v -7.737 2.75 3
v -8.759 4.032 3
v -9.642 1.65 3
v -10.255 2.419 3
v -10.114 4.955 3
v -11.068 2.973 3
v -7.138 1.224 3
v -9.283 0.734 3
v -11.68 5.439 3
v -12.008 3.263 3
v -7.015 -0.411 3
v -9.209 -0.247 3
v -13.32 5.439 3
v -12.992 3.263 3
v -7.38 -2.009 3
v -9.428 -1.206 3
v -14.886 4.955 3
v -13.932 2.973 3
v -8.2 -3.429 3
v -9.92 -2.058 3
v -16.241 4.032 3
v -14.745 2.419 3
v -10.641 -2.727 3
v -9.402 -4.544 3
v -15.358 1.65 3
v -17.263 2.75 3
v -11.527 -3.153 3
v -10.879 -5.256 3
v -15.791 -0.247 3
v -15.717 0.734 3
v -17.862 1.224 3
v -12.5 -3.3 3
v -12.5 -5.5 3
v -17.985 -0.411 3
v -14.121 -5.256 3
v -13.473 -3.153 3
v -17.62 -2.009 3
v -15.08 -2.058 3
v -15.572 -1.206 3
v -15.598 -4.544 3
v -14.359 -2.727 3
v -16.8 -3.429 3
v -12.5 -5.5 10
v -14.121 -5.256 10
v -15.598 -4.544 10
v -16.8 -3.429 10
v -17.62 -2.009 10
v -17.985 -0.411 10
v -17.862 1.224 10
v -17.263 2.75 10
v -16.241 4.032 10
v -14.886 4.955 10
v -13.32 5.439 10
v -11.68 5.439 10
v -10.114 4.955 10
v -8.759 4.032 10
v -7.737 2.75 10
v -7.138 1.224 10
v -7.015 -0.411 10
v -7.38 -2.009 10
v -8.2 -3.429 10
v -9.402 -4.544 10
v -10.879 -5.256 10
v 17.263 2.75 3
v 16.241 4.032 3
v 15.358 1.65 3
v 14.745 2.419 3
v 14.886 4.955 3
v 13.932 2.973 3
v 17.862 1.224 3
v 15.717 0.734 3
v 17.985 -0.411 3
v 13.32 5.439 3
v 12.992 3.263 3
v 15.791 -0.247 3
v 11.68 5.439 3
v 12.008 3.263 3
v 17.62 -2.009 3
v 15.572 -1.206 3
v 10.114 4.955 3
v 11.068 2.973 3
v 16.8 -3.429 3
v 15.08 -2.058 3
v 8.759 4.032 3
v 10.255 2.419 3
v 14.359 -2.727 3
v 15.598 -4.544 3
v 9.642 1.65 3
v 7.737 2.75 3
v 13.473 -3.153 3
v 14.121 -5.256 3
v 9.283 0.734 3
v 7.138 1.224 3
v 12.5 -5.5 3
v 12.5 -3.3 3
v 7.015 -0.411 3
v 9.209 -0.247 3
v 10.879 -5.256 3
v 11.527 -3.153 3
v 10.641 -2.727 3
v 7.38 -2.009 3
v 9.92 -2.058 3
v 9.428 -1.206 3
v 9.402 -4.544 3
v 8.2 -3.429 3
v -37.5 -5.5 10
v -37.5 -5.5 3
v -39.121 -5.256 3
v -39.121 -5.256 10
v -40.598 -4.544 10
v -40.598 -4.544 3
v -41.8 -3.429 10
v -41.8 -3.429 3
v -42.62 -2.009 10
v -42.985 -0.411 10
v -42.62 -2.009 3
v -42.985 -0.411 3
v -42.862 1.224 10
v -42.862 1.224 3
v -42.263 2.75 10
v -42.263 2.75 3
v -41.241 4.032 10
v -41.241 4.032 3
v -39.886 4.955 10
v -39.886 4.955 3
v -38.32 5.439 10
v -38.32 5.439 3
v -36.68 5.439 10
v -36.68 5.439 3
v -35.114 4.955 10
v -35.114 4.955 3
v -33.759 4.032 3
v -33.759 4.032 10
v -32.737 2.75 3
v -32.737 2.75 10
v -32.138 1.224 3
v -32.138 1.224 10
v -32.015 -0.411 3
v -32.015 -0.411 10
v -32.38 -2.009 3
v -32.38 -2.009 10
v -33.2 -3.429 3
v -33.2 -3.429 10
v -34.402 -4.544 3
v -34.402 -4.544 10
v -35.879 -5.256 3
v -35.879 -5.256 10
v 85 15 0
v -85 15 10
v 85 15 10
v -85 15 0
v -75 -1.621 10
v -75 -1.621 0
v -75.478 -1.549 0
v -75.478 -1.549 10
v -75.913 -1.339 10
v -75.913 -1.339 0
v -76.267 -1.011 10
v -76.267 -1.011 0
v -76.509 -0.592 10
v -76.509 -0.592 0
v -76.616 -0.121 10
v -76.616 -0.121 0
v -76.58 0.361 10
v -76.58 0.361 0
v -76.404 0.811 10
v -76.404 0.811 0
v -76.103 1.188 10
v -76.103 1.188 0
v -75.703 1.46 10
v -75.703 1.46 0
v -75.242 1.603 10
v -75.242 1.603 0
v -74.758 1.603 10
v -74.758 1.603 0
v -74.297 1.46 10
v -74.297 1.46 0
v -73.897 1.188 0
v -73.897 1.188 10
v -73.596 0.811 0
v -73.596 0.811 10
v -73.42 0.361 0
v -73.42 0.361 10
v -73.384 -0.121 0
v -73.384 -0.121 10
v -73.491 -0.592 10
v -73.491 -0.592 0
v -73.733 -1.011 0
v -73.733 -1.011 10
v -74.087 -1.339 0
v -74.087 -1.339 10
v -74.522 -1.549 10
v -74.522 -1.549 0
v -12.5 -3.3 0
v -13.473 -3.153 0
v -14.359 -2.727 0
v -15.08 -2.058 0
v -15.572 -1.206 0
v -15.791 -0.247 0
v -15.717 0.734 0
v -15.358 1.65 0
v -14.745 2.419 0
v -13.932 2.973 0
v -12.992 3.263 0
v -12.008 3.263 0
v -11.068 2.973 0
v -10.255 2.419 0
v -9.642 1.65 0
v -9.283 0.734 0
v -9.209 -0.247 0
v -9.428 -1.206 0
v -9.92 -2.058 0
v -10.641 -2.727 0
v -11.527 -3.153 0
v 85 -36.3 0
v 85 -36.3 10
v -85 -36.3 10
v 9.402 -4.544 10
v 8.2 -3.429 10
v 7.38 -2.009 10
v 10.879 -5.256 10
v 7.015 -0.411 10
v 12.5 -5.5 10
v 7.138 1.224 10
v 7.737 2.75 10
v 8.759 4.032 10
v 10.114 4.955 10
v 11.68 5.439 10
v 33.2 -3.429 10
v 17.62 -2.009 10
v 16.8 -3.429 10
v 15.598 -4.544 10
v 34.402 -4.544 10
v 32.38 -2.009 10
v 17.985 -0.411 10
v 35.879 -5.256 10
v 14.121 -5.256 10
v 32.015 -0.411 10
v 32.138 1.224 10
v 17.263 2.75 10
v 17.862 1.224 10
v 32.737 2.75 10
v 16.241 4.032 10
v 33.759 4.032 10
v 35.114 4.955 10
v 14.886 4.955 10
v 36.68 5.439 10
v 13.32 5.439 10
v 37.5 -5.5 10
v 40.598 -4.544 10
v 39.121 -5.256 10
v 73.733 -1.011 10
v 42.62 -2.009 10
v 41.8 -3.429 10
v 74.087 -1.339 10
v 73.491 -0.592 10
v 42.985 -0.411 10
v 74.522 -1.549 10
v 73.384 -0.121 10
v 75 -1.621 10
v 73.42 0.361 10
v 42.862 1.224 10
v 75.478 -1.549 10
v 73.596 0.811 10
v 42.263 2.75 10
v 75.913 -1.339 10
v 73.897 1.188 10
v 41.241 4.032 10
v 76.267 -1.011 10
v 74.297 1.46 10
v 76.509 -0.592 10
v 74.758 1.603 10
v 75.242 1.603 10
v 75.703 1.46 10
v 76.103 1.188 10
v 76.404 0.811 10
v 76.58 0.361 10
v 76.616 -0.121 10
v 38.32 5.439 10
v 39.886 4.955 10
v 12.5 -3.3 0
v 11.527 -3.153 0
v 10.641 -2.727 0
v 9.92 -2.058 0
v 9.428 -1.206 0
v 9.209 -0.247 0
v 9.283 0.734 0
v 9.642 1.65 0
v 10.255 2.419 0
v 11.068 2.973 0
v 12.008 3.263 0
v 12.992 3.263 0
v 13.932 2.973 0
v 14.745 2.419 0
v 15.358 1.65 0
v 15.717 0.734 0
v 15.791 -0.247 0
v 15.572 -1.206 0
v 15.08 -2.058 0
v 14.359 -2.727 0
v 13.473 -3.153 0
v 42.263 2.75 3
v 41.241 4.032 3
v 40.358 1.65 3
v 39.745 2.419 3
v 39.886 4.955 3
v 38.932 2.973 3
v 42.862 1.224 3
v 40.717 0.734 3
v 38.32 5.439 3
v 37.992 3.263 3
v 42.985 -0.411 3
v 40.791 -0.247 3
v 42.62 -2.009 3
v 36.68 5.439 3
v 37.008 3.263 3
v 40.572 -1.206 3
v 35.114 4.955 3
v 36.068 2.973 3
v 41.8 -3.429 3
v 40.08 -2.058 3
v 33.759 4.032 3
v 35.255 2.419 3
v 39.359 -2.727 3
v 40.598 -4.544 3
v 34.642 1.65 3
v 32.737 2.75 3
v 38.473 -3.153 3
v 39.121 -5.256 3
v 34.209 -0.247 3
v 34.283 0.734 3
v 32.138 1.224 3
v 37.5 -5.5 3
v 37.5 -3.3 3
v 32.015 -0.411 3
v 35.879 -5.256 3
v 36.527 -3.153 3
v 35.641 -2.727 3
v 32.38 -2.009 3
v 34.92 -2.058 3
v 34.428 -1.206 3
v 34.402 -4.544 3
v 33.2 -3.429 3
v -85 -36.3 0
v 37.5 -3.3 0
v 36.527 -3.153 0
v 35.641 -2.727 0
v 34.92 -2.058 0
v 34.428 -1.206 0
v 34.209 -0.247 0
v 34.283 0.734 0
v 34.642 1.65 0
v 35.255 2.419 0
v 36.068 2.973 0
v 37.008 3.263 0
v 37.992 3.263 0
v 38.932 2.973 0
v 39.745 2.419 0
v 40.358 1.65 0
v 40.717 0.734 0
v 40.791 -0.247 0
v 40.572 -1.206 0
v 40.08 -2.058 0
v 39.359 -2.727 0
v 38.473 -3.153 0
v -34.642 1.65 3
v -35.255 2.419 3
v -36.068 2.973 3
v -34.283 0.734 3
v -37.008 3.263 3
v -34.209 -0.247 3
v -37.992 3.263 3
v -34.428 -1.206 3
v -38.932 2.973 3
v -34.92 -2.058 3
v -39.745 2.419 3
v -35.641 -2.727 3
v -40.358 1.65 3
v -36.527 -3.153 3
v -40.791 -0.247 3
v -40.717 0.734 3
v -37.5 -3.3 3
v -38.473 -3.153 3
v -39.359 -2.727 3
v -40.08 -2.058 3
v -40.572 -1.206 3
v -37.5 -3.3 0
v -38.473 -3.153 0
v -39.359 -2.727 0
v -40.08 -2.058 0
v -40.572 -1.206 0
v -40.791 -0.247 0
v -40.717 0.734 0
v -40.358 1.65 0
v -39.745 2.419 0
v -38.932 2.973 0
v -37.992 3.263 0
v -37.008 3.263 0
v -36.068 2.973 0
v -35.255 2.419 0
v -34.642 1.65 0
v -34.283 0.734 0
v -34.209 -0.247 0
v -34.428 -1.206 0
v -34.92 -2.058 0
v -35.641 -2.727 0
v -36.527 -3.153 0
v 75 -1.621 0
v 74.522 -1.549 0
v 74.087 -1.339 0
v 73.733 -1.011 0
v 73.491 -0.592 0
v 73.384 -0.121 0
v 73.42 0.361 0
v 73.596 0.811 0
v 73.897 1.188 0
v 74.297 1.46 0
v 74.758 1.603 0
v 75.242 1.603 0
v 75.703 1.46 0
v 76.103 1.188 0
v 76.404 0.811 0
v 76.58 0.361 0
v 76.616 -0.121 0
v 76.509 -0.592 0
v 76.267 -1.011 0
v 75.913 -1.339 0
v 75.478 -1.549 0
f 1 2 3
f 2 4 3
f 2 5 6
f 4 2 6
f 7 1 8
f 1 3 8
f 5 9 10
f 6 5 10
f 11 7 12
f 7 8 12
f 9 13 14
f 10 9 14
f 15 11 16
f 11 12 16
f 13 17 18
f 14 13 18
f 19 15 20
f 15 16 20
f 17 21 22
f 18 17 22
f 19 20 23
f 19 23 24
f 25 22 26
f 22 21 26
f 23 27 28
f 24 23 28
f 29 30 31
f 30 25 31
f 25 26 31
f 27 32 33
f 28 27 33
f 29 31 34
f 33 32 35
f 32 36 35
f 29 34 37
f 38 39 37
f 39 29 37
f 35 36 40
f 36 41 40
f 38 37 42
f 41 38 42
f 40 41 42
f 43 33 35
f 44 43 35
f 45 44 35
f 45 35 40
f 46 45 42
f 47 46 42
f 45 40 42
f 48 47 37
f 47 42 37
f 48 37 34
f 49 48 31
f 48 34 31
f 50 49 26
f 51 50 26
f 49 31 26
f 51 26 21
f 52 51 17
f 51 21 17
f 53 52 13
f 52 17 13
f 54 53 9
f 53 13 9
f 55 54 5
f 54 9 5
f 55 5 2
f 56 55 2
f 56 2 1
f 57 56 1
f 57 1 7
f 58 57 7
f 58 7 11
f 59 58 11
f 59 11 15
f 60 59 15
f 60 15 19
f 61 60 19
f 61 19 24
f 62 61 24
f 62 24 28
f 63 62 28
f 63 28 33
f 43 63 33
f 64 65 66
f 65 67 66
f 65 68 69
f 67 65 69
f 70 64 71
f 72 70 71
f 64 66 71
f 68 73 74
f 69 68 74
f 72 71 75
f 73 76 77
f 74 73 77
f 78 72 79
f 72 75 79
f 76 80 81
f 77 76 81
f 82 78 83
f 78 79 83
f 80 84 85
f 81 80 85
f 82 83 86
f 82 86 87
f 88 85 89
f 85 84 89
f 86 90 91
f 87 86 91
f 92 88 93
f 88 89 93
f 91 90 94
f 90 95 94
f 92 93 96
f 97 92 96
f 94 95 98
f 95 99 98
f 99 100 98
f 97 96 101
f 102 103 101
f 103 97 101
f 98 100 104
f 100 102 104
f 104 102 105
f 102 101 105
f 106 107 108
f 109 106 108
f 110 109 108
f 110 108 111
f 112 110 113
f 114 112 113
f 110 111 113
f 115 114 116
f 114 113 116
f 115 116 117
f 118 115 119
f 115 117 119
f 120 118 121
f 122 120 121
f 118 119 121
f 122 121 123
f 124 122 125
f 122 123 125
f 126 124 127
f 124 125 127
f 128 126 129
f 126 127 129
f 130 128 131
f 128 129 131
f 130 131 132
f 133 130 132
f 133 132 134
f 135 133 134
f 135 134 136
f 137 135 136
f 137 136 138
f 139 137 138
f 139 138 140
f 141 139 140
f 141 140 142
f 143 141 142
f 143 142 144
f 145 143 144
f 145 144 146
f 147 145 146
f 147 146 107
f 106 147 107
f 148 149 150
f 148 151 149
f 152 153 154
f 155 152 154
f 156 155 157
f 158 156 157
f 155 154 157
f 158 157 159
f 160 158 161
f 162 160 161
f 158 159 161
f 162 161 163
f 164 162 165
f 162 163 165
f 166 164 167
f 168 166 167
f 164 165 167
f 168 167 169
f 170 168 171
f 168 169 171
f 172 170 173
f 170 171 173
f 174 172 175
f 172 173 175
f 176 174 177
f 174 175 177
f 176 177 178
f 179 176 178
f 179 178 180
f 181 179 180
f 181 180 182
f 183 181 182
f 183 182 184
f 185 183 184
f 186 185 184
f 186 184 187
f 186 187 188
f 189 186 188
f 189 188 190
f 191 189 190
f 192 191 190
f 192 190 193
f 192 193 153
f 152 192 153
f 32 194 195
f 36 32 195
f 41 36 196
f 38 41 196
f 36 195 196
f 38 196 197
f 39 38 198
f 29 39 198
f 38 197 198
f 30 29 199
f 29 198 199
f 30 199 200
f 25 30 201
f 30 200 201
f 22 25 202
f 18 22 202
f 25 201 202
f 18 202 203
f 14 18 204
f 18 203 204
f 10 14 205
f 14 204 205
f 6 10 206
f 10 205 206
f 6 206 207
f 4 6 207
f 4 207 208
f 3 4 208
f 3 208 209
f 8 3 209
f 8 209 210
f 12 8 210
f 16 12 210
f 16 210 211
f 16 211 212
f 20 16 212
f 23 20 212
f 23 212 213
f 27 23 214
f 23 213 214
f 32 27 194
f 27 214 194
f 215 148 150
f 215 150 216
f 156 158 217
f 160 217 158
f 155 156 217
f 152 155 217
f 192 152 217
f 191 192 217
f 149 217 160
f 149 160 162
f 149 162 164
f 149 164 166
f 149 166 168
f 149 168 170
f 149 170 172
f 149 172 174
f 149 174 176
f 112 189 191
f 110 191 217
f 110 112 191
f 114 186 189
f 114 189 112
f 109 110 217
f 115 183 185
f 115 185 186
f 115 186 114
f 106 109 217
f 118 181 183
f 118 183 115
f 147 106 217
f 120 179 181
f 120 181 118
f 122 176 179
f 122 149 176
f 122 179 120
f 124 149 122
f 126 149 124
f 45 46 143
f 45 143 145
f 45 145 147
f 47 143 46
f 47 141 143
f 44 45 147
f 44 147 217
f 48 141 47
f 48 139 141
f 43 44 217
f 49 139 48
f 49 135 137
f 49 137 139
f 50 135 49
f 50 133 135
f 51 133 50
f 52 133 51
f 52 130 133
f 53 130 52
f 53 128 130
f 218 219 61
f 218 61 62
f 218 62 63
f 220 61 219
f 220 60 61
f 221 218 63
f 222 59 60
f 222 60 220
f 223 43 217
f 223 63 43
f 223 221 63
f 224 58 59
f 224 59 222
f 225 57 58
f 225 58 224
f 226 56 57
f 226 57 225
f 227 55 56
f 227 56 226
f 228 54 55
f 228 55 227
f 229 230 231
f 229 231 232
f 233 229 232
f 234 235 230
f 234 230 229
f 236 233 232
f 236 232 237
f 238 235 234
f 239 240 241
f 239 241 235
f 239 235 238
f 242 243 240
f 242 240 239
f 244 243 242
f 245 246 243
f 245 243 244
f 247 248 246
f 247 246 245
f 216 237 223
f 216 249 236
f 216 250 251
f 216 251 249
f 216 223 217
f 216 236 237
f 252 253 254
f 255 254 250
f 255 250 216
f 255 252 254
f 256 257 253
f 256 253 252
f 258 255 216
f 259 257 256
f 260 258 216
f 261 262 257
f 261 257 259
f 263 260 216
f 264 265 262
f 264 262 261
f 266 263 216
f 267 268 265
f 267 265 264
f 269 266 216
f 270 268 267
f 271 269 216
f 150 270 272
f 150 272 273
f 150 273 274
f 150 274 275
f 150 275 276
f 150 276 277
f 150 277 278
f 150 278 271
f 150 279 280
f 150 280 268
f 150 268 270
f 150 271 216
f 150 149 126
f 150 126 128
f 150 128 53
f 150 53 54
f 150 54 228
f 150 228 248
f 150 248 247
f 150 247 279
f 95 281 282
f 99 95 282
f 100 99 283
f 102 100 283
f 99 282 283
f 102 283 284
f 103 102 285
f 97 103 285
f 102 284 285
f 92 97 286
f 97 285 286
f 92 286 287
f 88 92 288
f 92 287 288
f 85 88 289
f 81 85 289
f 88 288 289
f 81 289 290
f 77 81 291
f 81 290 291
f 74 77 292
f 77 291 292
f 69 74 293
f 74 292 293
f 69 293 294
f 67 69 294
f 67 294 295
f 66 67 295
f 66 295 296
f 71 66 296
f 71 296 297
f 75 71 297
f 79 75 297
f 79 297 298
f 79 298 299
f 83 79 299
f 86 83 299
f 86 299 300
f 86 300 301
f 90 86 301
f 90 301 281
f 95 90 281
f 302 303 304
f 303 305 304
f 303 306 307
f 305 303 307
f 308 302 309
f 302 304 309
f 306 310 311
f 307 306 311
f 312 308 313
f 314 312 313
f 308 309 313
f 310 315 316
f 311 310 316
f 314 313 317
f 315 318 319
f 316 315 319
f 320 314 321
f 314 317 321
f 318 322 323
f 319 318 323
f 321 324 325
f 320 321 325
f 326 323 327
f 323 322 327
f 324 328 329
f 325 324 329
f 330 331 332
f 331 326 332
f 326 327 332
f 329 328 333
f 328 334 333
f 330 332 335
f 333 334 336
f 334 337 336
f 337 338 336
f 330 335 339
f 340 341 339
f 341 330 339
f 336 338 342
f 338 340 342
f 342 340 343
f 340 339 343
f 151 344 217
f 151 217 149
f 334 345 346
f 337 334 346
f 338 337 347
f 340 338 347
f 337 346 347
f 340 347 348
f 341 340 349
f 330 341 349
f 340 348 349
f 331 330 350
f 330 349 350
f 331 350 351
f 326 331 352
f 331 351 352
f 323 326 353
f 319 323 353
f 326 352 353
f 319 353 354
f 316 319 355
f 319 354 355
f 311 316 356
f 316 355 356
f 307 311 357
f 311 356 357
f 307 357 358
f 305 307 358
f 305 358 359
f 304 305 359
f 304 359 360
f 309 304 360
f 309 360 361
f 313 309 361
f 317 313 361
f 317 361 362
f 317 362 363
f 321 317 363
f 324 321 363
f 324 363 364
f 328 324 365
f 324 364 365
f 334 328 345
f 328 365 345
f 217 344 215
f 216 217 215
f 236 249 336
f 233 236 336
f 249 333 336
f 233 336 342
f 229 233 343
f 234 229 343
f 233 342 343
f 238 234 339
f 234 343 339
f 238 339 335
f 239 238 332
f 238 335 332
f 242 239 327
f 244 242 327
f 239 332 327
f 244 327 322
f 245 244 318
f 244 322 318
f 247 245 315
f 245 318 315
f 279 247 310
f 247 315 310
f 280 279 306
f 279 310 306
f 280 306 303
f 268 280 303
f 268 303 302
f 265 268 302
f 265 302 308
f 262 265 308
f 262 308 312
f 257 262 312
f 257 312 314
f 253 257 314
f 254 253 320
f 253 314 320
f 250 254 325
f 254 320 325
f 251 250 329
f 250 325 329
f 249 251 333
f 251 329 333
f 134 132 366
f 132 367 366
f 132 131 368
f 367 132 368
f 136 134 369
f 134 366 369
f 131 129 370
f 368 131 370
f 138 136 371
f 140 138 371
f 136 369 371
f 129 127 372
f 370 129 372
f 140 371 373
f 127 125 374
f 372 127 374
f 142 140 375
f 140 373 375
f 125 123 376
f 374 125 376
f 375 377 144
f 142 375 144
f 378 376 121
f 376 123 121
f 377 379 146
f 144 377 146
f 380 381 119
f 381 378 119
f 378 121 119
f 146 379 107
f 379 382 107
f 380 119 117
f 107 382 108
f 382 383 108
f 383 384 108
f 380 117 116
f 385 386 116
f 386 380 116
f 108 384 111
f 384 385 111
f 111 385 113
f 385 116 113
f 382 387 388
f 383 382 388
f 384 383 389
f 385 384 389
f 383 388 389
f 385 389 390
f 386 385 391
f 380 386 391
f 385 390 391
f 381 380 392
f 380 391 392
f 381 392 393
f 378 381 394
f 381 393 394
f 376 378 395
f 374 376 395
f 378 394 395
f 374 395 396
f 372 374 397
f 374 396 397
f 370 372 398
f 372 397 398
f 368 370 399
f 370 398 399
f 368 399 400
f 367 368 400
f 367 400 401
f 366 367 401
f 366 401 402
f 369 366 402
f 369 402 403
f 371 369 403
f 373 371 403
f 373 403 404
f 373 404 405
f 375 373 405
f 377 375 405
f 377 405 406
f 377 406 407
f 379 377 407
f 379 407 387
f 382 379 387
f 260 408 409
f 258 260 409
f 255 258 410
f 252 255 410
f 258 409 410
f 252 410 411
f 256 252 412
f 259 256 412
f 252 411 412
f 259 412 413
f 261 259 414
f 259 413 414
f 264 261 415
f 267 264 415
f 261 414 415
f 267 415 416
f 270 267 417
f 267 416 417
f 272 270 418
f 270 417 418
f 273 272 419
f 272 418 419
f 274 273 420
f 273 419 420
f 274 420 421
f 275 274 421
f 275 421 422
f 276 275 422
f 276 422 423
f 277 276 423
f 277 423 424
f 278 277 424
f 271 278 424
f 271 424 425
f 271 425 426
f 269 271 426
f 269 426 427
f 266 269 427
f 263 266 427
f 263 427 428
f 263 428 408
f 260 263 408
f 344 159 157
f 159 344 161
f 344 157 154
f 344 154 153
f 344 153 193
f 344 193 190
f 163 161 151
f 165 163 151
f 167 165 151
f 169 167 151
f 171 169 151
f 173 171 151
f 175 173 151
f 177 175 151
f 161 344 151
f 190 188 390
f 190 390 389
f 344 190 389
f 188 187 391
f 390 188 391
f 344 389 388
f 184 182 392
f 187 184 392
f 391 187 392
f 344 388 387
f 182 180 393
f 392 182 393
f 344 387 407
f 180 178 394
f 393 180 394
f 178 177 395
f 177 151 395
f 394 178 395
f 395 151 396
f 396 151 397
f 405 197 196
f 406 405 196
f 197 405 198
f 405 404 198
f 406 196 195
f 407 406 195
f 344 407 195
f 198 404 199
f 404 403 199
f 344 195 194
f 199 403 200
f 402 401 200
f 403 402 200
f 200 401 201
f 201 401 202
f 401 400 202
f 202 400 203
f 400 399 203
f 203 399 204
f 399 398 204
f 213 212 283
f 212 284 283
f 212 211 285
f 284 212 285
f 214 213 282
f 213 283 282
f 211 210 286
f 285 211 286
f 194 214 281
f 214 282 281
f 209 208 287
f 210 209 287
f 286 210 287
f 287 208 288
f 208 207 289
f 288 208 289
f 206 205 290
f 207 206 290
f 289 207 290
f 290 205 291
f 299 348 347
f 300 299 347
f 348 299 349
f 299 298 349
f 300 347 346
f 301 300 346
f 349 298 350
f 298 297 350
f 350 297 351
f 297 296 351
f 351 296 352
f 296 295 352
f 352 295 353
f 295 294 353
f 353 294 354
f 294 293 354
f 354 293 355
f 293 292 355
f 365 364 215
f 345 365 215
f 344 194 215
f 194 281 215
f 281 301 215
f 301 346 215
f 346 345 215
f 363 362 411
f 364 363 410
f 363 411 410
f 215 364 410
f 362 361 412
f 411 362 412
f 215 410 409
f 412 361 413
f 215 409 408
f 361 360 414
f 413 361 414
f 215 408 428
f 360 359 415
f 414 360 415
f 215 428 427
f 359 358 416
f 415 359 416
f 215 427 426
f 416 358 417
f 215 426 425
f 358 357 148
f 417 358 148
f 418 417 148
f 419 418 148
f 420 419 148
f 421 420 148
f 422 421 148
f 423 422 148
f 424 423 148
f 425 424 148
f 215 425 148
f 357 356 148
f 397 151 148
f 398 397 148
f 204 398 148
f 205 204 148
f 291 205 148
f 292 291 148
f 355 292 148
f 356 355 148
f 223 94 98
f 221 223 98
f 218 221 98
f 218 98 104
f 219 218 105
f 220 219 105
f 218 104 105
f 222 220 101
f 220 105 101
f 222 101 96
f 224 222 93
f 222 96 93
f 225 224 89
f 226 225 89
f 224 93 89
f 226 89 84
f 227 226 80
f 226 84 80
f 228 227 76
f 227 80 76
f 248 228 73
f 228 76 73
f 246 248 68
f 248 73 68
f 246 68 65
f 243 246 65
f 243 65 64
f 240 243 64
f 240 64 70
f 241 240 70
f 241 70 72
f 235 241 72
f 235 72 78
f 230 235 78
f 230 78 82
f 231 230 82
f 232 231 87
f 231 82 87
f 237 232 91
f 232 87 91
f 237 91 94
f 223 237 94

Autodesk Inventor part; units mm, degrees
ref_plane "YZ Plane" through (0, 0, 0) normal (1, 0, 0) x (0, 1, 0)
ref_plane "XZ Plane" through (0, 0, 0) normal (0, 1, 0) x (-1, 0, 0)
ref_plane "XY Plane" through (0, 0, 0) normal (0, 0, 1) x (1, 0, 0)
sketch "Sketch1" plane through (0, 0, 0) normal (0, 0, 1) x (1, 0, 0)
  line L0 (-85, 15) -> (85, 15)
  line L1 (85, 15) -> (85, -15)
  line L2 (85, -15) -> (-85, -15)
  line L3 (-85, -15) -> (-85, 15)
  line L4 (85, -15) -> (-85, -15)
  line L5 (-85, -15) -> (-85, -36.3)
  line L6 (-85, -36.3) -> (85, -36.3)
  line L7 (85, -36.3) -> (85, -15)
  point P0 (0, 0)
  dimension "d0" = 30
  dimension "d1" = 170
  dimension "d2" = 85
  dimension "d3" = 15
  dimension "d34" = 21.3
  dimension "d35" = 170
extrude "Extrusion1" add sketch "Sketch1" along normal blind 10
sketch "Sketch2" plane through (0, 0, 10) normal (0, 0, 1) x (1, 0, 0)
  point P0 (0, 0)
  point P1 (-37.5, 0)
  point P2 (-12.5, 0)
  point P3 (12.5, 0)
  point P4 (37.5, 0)
  dimension "d30" = 25
  dimension "d31" = 25
  dimension "d32" = 25
  dimension "d33" = 12.5
hole "Hole1" at (-37.5, 0, 10) at (-12.5, 0, 10) at (12.5, 0, 10) at (37.5, 0, 10) direction (0, 0, -1) diameter 6.6 end through all counterbore diameter 11 counterbore depth 7 clearance for "Hex Head Cap Screw ISO 24017" size "M6" standard "ISO"
sketch "Sketch3" plane through (0, 0, 10) normal (0, 0, 1) x (1, 0, 0)
  point P0 (0, 0)
  point P1 (75, 0)
  point P2 (-75, 0)
  dimension "d16" = 150
  dimension "d17" = 75
hole "Hole2" at (75, 0, 10) at (-75, 0, 10) direction (0, 0, -1) diameter 3.242 end through all thread size "M4x0.7" class "6H" standard "ISO Metric profile"
equation "\"d2\" = 0.5 * d1"
equation "\"d3\" = 0.5 * d0"
equation "\"d35\" = d1"
equation "\"d33\" = 0.5 * d31"
equation "\"d17\" = 0.5 * d16"
properties part number "zStackJackAttach_piece1"
